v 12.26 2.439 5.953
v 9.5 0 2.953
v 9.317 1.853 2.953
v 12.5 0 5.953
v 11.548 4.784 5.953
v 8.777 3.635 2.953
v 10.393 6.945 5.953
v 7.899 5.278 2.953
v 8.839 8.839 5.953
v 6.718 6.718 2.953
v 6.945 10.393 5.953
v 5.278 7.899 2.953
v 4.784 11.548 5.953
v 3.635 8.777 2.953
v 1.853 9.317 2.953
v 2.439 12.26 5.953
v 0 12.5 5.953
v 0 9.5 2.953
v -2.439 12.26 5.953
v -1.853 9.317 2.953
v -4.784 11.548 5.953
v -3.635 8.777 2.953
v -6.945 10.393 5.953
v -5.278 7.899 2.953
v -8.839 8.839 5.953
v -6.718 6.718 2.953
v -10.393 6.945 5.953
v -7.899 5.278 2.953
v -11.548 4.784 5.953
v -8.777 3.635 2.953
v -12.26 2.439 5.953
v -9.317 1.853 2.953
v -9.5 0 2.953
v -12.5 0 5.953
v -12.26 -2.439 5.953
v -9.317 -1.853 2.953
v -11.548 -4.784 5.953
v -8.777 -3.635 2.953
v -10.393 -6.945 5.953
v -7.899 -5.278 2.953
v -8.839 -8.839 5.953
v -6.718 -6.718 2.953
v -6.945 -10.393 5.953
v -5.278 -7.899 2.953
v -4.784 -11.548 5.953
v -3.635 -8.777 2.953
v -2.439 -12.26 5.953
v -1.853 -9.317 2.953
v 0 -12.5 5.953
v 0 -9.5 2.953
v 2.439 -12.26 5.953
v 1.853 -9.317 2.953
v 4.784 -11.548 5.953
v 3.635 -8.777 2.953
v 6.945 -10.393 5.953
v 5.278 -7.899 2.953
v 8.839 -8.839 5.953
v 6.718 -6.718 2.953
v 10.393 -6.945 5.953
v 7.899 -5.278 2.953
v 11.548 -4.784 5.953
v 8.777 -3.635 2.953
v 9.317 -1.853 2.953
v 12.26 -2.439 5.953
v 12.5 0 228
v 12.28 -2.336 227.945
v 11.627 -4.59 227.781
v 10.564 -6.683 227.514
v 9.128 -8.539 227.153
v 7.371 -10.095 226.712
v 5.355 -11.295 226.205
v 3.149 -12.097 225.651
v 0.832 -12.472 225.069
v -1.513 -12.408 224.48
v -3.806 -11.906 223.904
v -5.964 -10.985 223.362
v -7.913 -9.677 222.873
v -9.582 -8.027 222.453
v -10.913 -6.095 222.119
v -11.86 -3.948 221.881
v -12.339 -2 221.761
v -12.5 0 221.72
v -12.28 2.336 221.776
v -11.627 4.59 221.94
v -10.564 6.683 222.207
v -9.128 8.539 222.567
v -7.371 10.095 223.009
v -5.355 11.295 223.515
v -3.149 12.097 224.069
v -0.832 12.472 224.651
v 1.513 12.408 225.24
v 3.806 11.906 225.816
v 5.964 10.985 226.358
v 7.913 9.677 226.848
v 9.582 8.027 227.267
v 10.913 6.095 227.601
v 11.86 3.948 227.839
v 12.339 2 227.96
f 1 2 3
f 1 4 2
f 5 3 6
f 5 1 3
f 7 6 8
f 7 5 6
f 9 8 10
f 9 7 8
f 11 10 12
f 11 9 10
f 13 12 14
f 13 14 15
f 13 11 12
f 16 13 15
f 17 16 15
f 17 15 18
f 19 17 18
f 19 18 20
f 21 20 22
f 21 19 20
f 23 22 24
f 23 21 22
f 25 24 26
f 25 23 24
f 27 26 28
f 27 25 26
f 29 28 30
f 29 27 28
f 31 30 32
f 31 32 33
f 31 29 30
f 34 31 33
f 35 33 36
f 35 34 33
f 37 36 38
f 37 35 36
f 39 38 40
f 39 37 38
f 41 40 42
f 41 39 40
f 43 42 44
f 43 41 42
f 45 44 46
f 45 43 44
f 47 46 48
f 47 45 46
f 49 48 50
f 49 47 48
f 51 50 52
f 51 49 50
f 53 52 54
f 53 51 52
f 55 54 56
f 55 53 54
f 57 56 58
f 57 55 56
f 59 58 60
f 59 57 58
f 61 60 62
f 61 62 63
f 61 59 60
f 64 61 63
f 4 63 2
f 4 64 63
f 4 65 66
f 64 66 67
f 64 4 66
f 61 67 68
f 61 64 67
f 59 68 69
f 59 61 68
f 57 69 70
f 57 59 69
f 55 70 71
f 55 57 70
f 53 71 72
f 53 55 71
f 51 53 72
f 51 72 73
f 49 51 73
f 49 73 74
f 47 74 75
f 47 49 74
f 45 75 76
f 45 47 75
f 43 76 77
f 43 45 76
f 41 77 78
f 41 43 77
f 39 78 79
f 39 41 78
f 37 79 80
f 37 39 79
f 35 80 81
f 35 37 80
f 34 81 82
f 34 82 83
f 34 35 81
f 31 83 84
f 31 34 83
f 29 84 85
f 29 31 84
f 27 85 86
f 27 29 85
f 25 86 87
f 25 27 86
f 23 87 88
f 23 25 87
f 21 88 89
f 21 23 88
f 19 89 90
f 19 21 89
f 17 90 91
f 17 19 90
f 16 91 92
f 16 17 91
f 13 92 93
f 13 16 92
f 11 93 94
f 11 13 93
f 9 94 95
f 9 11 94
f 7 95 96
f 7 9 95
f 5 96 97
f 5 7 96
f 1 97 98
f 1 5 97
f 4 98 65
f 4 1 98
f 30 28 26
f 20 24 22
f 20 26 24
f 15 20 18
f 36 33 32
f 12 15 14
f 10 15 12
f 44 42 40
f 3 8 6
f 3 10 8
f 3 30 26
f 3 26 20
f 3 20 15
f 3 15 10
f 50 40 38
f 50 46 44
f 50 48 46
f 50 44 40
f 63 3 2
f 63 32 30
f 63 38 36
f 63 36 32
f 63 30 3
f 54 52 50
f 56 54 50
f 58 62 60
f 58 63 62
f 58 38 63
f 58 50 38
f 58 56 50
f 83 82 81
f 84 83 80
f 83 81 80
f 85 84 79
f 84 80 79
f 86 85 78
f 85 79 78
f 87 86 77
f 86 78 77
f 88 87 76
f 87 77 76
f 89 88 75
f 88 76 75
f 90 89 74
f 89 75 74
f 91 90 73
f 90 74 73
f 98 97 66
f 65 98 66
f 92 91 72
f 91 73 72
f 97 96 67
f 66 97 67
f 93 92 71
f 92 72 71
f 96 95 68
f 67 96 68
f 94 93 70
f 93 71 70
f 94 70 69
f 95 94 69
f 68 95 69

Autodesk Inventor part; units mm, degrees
ref_plane "YZ Plane" through (0, 0, 0) normal (1, 0, 0) x (0, 1, 0)
ref_plane "XZ Plane" through (0, 0, 0) normal (0, 1, 0) x (-1, 0, 0)
ref_plane "XY Plane" through (0, 0, 0) normal (0, 0, 1) x (1, 0, 0)
sketch "Sketch1" plane through (0, 0, 0) normal (0, 0, 1) x (1, 0, 0)
  circle A0 centre (0, 0) radius 12.5
  dimension "d0" = 25
extrude "Extrusion1" add sketch "Sketch1" along normal blind 228
sketch "Sketch2" plane through (0, 0, 0) normal (0, 1, 0) x (-1, 0, 0)
  line L0 (12.5, 228) -> (-12.5, 228) projected
  line L1 (-12.5, 0) -> (12.5, 0) projected
  line L2 (12.5, 0) -> (12.5, 228) projected
  line L3 (12.5, 228) -> (-12.5, 228) projected
  line L4 (12.5, 221.7204) -> (-12.5, 228)
  point P0 (0, 0)
  dimension "d5" = 14.1
extrude "Extrusion2" cut sketch "Sketch2" along normal through all both and the other way through all
sketch "Sketch3" plane through (0, 0, 0) normal (0, 1, 0) x (-1, 0, 0)
  line L0 (12.5, 0) -> (12.5, 221.7204) projected
  line L1 (-12.5, 0) -> (-12.5, 228) projected
  line L2 (-12.5, 0) -> (12.5, 0) projected
  line L3 (12.5, 2.953) -> (-12.5, 2.953)
  line L4 (-12.5, 2.953) -> (-12.5, 0)
  line L5 (-12.5, 0) -> (12.5, 0)
  line L6 (12.5, 0) -> (12.5, 2.953)
  point P0 (0, 0)
  dimension "d6" = 2.953
extrude "Extrusion3" cut sketch "Sketch3" along normal through all both and the other way through all
chamfer "Chamfer1" distance 3 angle 45 1 edges at (-12.5, 0, 2.953)
equation "\"d0\" = trappestifter_dia"
equation "\"d1\" = trappestifter_laengde"
equation "\"trappestifter_dia\" = 25"
equation "\"trappestifter_laengde\" = 228"
equation "\"perforeringsbredde\" = 6"
equation "\"perforeringshullaengde\" = 62.8"
equation "\"perforeringsoffset\" = 8"
equation "\"perforeringsoffset_top\" = 8"
equation "\"perforeringsoffset_bund\" = 8"
equation "\"laskehul_dia\" = 13"
equation "\"perforeringshullaengde_bund\" = 61.6"
equation "\"perforeringshullaengde_top\" = 61"
equation "\"trappestifter_huldia\" = 25.8"
equation "\"trappestifter_skraa_huldia\" = 26.6"
equation "\"trappevinkel\" = 34.3deg"
equation "\"balusterhul_udvidelse\" = 1"
equation "\"pladetykkelse\" = 3"
equation "\"trinbredde\" = 1884"
properties part number "trappestift skrå" material "S355J2"
